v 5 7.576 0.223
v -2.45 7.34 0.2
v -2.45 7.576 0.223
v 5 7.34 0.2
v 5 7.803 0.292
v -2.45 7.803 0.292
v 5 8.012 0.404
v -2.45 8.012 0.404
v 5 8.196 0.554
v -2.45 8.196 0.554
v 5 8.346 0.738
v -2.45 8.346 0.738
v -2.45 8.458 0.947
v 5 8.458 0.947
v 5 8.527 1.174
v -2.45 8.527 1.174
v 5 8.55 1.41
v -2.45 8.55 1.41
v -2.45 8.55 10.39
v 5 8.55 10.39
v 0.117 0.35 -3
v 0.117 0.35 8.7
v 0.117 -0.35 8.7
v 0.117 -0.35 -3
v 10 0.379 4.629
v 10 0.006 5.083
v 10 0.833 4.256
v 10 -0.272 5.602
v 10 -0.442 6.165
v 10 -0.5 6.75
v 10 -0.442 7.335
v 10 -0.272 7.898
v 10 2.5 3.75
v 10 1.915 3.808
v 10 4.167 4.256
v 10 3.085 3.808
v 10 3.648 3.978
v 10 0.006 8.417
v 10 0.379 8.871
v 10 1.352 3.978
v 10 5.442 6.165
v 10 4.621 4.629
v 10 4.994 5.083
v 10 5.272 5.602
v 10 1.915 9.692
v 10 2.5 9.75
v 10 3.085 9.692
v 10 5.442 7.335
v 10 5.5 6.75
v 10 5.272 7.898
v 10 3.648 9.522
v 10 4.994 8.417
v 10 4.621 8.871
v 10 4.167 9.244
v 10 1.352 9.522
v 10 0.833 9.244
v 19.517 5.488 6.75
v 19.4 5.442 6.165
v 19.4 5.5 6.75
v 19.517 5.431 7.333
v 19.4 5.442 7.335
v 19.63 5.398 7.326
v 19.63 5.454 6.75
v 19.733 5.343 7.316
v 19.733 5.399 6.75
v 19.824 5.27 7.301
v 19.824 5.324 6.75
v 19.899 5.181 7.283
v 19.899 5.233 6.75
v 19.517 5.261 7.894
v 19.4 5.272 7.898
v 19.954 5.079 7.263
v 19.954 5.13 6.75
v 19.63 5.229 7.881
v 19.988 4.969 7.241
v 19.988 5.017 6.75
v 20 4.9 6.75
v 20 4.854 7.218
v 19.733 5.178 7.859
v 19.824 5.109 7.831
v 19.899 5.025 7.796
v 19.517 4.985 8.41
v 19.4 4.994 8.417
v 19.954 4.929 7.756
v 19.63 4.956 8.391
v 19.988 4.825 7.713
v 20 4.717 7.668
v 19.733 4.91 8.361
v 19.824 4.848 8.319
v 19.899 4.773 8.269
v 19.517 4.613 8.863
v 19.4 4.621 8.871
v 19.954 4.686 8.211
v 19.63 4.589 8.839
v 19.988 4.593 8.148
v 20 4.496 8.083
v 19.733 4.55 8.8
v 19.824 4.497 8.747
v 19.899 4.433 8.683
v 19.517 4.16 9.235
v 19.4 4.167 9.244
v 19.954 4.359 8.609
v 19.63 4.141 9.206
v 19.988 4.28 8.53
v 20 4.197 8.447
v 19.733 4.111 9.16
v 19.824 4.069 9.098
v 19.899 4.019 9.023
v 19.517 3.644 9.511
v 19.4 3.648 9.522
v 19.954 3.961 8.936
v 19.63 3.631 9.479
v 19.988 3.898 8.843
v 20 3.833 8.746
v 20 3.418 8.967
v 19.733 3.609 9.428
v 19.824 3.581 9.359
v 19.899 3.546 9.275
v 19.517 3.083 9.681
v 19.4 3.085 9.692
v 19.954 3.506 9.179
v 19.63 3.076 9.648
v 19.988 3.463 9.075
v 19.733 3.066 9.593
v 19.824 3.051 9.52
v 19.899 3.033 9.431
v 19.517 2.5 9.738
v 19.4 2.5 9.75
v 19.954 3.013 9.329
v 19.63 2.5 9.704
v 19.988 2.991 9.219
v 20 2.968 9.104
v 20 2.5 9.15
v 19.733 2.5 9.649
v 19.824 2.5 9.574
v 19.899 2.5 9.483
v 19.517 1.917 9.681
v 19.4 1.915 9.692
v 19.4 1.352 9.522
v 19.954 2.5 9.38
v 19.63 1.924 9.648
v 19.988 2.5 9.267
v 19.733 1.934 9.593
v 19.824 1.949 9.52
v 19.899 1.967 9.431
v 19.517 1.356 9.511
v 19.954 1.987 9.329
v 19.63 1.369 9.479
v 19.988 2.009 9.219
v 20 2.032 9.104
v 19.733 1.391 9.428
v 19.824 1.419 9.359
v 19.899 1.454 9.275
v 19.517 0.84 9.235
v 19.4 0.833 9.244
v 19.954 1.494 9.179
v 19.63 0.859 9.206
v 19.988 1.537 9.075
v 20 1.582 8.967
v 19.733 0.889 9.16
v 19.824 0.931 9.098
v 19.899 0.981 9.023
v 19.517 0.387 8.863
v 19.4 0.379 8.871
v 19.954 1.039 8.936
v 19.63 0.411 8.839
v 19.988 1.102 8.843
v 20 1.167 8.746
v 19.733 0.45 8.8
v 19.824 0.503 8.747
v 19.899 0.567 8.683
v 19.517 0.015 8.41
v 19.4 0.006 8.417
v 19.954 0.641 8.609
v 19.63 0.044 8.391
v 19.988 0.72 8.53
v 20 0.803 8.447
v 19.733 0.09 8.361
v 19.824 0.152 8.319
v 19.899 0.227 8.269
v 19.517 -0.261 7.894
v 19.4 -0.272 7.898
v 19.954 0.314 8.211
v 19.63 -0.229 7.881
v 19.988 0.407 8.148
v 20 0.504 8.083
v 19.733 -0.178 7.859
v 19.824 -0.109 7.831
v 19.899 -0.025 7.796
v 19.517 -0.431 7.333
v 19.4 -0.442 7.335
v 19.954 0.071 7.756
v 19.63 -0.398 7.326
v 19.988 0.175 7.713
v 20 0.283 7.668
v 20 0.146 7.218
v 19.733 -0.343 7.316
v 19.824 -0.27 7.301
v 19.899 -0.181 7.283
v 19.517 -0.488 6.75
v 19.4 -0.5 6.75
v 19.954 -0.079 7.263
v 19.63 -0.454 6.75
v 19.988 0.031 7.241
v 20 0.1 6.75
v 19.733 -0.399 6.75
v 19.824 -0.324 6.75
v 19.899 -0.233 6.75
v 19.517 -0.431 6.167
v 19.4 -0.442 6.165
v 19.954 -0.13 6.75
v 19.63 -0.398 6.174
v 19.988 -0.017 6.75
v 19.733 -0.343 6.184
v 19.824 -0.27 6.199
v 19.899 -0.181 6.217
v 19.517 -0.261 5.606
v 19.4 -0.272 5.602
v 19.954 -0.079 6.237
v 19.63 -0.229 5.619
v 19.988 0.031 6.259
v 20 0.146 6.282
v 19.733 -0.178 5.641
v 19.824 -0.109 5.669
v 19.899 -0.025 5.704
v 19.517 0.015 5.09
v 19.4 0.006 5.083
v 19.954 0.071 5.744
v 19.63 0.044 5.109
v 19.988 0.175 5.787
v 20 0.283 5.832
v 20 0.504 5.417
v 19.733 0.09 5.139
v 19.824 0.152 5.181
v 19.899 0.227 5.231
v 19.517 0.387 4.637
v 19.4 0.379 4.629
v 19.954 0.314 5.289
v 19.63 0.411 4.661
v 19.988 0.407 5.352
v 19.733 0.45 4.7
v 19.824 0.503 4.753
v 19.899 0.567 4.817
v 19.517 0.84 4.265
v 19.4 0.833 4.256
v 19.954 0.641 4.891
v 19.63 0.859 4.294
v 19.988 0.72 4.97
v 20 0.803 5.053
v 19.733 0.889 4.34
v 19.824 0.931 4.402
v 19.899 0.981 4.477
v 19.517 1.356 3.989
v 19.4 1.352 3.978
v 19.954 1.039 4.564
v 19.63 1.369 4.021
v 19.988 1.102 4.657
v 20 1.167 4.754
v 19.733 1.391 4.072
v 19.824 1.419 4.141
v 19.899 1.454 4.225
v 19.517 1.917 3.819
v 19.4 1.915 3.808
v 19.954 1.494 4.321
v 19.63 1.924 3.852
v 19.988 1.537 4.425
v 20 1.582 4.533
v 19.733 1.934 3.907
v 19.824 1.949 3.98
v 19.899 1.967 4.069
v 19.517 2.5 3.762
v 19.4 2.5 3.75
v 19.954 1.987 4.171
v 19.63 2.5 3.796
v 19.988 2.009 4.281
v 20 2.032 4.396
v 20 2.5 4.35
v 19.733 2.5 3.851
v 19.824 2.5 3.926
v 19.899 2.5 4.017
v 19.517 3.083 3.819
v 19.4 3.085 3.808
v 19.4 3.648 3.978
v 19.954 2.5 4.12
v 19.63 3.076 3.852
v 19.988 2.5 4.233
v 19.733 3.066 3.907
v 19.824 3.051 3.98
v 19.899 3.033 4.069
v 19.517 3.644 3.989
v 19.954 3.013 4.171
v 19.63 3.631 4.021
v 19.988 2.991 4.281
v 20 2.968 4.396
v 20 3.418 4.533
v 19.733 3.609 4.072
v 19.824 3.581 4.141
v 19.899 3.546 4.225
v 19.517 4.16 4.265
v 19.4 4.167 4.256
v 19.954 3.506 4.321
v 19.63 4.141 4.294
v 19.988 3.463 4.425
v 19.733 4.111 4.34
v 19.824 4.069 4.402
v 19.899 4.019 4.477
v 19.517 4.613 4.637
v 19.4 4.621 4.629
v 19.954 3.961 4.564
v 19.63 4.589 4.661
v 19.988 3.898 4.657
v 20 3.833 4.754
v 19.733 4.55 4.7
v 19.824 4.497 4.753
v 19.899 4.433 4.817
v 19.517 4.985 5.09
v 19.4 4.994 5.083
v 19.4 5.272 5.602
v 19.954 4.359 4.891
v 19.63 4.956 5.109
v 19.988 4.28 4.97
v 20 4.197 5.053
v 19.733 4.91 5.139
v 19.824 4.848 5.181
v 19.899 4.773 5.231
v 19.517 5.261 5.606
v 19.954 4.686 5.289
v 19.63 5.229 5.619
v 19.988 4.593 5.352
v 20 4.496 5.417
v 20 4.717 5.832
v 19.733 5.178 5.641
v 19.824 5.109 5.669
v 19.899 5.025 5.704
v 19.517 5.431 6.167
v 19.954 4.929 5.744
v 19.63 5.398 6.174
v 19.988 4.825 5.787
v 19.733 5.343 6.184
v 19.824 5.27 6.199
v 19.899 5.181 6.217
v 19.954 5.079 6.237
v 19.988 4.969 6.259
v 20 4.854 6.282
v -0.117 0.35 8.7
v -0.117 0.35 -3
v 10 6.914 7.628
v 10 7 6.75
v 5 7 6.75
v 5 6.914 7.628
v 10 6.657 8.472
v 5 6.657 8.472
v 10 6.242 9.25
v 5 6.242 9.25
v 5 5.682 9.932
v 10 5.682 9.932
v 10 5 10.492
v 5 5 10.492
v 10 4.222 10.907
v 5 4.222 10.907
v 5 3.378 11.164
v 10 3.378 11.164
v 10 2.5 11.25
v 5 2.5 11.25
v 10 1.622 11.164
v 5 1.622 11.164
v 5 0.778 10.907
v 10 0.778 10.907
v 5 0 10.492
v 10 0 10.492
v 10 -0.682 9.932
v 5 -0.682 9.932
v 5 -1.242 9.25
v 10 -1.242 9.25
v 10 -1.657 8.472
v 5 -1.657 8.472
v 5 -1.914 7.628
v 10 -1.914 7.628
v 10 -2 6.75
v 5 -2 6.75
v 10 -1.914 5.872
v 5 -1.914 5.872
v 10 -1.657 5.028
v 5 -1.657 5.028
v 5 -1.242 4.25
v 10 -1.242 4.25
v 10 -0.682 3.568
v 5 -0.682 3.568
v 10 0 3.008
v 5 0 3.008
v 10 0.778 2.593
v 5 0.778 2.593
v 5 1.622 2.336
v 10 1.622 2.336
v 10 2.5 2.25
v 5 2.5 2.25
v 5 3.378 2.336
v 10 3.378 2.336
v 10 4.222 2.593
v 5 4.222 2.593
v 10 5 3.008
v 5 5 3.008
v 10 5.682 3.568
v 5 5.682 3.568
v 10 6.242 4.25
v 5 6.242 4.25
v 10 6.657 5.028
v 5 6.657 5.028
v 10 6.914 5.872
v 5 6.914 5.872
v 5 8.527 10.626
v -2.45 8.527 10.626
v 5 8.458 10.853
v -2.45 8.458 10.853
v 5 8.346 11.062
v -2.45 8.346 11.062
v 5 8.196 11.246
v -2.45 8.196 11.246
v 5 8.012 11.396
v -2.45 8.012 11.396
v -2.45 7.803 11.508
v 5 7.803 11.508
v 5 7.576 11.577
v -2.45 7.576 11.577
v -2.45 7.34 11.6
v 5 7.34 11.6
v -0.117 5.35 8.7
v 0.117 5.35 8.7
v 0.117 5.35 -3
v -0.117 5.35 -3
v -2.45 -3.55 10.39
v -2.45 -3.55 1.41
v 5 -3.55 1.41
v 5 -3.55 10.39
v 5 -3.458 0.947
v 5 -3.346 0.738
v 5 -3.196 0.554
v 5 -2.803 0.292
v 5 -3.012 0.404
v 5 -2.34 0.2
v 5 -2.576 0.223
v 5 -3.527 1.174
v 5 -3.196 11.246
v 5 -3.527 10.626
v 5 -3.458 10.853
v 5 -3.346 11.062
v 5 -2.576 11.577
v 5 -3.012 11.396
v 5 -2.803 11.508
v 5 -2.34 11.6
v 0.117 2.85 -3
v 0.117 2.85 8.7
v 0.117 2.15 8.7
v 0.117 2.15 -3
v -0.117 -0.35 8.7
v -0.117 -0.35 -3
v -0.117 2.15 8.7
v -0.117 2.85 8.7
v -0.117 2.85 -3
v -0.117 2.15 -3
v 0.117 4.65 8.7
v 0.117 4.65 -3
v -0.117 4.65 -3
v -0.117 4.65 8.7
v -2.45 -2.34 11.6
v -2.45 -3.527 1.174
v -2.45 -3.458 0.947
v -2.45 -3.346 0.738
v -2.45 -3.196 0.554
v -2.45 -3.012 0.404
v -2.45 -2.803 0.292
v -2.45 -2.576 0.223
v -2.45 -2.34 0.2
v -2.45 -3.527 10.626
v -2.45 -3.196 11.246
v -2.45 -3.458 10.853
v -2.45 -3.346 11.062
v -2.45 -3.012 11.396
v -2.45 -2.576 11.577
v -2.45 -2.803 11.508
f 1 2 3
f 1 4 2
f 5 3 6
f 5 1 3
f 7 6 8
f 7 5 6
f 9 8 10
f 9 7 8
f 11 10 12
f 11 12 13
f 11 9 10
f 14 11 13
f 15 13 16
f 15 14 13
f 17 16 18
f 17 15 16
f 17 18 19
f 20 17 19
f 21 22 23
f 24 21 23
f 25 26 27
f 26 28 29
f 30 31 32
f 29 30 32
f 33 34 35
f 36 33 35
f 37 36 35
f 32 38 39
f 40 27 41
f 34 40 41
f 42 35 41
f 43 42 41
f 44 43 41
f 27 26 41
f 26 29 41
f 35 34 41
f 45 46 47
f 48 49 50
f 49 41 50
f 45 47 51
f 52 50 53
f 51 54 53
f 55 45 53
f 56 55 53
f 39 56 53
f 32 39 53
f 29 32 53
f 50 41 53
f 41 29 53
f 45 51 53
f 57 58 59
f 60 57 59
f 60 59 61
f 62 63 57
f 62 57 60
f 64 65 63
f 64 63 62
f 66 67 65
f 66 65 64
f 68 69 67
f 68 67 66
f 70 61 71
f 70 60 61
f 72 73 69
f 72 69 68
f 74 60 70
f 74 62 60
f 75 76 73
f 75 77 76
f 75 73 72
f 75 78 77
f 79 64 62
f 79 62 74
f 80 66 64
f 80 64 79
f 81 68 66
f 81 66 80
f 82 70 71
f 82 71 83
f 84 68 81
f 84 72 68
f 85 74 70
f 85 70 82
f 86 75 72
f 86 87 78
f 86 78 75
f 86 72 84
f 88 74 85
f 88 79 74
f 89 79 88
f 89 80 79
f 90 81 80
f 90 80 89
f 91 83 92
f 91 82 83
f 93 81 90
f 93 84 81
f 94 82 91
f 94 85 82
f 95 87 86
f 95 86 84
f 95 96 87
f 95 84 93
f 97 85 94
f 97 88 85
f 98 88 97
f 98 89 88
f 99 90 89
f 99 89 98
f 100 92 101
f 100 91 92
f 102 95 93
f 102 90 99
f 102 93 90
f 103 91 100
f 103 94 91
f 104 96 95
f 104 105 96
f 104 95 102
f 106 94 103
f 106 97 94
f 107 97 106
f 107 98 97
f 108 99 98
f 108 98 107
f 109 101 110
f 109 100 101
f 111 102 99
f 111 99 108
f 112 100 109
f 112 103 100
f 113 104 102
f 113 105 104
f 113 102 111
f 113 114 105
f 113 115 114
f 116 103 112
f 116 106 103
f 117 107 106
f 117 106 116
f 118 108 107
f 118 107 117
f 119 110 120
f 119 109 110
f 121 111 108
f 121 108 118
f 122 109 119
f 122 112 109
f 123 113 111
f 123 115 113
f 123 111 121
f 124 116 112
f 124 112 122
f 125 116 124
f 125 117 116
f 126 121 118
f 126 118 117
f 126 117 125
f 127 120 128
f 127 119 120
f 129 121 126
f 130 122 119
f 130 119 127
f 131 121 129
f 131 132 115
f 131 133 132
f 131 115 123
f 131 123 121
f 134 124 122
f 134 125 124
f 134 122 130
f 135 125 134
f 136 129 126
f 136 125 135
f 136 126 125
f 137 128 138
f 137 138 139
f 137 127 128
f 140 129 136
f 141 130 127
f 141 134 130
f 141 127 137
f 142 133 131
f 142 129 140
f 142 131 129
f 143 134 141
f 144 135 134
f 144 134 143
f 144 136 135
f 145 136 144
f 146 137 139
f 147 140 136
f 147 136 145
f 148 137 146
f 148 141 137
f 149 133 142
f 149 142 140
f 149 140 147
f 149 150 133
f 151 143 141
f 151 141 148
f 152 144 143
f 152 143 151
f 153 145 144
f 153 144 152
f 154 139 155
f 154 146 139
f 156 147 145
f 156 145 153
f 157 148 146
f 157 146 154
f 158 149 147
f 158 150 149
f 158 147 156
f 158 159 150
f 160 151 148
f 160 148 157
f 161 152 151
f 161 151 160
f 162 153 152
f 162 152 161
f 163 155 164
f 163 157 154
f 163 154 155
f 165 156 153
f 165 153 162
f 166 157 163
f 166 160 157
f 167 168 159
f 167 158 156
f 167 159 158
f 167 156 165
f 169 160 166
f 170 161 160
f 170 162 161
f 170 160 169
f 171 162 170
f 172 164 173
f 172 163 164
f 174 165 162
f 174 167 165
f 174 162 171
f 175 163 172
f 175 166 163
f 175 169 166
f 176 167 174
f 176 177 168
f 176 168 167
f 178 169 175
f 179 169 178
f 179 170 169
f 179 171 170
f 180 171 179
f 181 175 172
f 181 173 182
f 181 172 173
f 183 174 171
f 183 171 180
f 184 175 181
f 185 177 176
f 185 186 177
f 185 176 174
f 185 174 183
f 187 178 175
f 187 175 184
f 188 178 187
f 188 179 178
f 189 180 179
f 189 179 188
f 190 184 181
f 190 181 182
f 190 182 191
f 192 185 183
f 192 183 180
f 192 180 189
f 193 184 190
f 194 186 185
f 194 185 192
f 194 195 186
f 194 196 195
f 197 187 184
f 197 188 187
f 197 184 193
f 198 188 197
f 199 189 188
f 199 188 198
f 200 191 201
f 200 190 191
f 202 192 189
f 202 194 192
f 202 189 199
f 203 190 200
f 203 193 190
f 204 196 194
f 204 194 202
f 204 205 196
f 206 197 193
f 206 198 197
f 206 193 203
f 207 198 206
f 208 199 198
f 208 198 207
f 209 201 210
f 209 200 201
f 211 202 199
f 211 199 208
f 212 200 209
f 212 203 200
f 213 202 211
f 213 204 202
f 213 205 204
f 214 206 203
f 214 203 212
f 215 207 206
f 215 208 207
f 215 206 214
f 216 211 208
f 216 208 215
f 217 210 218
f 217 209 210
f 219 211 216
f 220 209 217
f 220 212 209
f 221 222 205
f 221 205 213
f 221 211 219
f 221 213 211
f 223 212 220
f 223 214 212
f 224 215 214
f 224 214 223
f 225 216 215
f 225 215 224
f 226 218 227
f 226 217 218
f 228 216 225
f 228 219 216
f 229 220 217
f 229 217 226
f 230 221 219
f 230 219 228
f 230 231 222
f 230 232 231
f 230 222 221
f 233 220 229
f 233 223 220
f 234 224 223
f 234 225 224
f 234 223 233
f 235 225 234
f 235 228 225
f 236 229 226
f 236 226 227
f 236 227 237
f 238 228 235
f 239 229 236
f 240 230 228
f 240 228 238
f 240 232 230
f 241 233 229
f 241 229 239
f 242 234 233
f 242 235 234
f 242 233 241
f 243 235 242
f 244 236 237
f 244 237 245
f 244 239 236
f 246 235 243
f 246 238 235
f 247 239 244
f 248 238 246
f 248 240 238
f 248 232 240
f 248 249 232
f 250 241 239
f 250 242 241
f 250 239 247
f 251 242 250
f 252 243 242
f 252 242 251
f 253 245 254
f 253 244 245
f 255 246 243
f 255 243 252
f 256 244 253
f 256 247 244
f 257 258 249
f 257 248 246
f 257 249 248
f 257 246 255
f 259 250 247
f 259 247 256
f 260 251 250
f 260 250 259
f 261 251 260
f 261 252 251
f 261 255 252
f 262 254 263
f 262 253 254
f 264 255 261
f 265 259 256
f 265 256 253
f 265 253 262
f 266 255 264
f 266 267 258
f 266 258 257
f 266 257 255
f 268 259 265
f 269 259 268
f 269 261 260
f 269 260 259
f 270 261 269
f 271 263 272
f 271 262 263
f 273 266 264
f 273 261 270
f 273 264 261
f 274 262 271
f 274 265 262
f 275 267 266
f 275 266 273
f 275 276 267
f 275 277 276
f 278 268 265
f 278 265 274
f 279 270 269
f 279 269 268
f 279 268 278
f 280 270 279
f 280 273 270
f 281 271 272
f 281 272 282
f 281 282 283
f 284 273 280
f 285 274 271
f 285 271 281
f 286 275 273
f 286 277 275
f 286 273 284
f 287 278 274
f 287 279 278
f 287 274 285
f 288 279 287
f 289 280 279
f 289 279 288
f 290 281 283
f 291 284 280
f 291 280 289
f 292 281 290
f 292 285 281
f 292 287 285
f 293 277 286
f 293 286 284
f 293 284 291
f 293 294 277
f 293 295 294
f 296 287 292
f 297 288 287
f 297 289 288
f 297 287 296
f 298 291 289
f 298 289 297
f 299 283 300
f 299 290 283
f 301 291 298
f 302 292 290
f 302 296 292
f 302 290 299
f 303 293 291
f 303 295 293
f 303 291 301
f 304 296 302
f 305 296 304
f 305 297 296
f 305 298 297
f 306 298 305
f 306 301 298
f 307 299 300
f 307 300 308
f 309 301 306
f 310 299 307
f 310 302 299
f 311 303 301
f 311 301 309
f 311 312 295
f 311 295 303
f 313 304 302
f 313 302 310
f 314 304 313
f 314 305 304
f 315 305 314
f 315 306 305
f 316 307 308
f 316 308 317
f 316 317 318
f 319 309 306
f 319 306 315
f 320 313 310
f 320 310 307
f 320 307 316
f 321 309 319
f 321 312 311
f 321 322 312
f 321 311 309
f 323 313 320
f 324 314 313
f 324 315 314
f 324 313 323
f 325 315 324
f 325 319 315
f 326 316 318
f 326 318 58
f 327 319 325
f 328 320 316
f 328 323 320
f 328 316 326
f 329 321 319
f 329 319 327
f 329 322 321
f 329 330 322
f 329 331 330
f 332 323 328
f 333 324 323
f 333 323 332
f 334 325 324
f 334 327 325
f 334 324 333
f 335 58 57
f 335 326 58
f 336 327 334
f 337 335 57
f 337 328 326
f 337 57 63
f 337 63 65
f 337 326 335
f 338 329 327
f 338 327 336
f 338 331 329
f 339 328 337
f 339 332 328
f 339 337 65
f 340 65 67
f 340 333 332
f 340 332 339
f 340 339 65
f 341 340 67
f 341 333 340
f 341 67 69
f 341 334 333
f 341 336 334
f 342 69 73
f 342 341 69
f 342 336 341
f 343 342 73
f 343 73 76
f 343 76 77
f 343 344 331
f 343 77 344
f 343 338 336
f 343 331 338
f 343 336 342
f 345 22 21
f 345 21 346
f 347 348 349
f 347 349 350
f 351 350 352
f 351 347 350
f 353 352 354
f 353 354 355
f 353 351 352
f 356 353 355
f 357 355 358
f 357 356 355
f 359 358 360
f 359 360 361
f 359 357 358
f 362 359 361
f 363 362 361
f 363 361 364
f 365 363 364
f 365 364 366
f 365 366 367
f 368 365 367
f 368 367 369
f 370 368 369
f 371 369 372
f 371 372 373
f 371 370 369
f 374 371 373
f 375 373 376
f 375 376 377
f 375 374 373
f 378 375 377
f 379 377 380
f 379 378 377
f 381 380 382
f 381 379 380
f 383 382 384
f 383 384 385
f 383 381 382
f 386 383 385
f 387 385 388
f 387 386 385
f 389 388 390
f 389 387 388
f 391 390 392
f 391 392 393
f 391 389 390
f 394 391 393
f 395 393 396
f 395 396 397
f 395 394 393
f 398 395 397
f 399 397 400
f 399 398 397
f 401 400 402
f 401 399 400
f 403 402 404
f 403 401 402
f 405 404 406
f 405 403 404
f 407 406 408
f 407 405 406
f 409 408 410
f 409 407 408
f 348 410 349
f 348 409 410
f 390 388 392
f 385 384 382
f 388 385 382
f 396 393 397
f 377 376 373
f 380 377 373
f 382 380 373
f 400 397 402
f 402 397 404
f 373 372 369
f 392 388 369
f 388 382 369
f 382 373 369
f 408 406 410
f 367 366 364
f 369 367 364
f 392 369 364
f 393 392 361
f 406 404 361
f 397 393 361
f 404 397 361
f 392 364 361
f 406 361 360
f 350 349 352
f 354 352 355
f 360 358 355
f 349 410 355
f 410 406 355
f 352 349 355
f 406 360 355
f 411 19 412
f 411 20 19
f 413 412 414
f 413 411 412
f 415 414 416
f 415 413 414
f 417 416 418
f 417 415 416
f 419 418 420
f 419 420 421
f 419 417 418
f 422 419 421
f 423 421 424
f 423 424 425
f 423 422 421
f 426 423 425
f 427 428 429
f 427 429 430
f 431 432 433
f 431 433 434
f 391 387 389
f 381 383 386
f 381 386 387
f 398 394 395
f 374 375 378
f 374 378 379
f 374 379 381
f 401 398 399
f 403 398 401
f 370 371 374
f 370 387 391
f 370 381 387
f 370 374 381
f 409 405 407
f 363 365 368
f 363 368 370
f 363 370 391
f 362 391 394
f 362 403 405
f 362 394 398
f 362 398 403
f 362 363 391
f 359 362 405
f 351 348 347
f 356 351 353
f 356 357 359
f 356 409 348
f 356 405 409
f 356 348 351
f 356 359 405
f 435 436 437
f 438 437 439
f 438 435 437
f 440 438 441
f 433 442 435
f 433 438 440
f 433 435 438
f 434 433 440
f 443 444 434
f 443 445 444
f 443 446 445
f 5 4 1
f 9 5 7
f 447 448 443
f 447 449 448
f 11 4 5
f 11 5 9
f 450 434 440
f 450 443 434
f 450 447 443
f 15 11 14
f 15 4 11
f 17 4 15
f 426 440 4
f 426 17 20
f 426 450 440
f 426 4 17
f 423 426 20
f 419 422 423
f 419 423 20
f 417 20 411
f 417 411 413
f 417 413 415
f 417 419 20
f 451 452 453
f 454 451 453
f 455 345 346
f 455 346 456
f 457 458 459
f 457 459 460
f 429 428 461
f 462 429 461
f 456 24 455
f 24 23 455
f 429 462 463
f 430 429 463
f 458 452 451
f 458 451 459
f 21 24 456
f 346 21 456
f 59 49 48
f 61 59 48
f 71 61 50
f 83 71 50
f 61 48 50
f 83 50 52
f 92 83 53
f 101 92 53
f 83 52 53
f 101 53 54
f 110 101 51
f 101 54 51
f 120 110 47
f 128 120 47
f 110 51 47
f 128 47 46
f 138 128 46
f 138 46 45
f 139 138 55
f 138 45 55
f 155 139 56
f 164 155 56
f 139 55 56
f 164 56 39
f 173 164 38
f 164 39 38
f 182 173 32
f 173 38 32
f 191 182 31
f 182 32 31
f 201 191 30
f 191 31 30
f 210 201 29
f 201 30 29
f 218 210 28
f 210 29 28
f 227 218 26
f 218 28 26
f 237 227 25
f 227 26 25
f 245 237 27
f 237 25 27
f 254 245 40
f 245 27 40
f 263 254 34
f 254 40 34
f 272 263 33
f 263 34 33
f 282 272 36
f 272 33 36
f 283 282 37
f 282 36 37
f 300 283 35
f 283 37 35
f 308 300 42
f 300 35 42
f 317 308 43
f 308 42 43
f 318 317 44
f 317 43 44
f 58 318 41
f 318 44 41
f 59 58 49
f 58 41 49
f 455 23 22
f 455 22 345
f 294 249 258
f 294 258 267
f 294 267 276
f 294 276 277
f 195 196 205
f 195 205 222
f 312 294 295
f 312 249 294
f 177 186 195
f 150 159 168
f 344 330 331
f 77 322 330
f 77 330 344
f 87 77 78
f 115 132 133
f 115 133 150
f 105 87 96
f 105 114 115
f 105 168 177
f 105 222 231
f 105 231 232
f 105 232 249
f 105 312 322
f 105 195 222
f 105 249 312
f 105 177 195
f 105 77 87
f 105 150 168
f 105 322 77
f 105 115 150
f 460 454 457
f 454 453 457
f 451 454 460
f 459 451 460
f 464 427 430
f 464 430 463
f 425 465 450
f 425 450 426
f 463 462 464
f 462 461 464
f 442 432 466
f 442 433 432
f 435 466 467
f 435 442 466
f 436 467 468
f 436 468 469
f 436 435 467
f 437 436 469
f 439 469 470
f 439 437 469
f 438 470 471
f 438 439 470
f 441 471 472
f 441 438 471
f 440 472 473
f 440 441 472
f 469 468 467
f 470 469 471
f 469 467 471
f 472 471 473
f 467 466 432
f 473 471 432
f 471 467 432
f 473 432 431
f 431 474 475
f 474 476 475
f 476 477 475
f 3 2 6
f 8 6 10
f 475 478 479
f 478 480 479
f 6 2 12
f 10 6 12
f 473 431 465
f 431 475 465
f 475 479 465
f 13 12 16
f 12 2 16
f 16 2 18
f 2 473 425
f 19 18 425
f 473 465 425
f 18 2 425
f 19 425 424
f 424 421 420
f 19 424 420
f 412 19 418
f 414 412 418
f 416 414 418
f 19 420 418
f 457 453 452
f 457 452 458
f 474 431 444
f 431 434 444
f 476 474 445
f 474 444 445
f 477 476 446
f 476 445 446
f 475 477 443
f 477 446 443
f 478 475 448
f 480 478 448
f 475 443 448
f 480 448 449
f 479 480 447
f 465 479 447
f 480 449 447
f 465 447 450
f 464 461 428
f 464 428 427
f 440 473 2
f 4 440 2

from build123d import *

# Parameters (mm, degrees)
SKETCH001_R       = 4.5
PAD001_DEPTH      = 5
SKETCH003_W       = 0.233334
SKETCH003_H       = 0.7
PAD002_DEPTH      = 8.7
PAD002_DEPTH_BACK = 3
SKETCH004_R       = 3
PAD003_DEPTH      = 10
FILLET_R          = 0.6
SKETCH_W          = 12.1
SKETCH_H          = 11.4
PAD_DEPTH         = 7.45
FILLET001_R       = 1.21


with BuildPart() as pad001:
    # Sketch001 → Pad001 (new body)
    with BuildSketch(Plane.YZ.offset(10)):
        with Locations((2.5, 6.75)):
            Circle(SKETCH001_R)
    extrude(amount=-PAD001_DEPTH)


with BuildPart() as pad002:
    # Sketch003 → Pad002 (new body, two sides)
    with BuildSketch(Plane(origin=(0, 0, 0), x_dir=(-1, 0, 0), z_dir=(0, 0, 1))) as pad002_sk:
        Rectangle(SKETCH003_W, SKETCH003_H)
        with Locations((0, -2.5)):
            Rectangle(SKETCH003_W, SKETCH003_H)
        with Locations((0, -5)):
            Rectangle(SKETCH003_W, SKETCH003_H)
    extrude(amount=PAD002_DEPTH)
    extrude(pad002_sk.sketch, amount=-PAD002_DEPTH_BACK)


with BuildPart() as fillet_body:
    # Sketch004 → Pad003 (new body)
    with BuildSketch(Plane.YZ.offset(10)):
        with Locations((2.5, 6.75)):
            Circle(SKETCH004_R)
    extrude(amount=PAD003_DEPTH)

    # Fillet
    fillet_edges = [fillet_body.edges().sort_by_distance(p)[0] for p in [
        (20, -0.5, 6.75),
    ]]
    fillet(fillet_edges, radius=FILLET_R)


with BuildPart() as fillet001:
    # Sketch → Pad (new body)
    with BuildSketch(Plane.YZ.offset(-2.45)):
        with Locations((2.5, 5.9)):
            Rectangle(SKETCH_W, SKETCH_H)
    extrude(amount=PAD_DEPTH)

    # Fillet001
    fillet001_edges = [fillet001.edges().sort_by_distance(p)[0] for p in [
        (1.275, -3.55, 11.6),
        (1.275, 8.55, 11.6),
        (1.275, -3.55, 0.2),
        (1.275, 8.55, 0.2),
    ]]
    fillet(fillet001_edges, radius=FILLET001_R)


solid = Compound([pad001.part, pad002.part, fillet_body.part, fillet001.part])
